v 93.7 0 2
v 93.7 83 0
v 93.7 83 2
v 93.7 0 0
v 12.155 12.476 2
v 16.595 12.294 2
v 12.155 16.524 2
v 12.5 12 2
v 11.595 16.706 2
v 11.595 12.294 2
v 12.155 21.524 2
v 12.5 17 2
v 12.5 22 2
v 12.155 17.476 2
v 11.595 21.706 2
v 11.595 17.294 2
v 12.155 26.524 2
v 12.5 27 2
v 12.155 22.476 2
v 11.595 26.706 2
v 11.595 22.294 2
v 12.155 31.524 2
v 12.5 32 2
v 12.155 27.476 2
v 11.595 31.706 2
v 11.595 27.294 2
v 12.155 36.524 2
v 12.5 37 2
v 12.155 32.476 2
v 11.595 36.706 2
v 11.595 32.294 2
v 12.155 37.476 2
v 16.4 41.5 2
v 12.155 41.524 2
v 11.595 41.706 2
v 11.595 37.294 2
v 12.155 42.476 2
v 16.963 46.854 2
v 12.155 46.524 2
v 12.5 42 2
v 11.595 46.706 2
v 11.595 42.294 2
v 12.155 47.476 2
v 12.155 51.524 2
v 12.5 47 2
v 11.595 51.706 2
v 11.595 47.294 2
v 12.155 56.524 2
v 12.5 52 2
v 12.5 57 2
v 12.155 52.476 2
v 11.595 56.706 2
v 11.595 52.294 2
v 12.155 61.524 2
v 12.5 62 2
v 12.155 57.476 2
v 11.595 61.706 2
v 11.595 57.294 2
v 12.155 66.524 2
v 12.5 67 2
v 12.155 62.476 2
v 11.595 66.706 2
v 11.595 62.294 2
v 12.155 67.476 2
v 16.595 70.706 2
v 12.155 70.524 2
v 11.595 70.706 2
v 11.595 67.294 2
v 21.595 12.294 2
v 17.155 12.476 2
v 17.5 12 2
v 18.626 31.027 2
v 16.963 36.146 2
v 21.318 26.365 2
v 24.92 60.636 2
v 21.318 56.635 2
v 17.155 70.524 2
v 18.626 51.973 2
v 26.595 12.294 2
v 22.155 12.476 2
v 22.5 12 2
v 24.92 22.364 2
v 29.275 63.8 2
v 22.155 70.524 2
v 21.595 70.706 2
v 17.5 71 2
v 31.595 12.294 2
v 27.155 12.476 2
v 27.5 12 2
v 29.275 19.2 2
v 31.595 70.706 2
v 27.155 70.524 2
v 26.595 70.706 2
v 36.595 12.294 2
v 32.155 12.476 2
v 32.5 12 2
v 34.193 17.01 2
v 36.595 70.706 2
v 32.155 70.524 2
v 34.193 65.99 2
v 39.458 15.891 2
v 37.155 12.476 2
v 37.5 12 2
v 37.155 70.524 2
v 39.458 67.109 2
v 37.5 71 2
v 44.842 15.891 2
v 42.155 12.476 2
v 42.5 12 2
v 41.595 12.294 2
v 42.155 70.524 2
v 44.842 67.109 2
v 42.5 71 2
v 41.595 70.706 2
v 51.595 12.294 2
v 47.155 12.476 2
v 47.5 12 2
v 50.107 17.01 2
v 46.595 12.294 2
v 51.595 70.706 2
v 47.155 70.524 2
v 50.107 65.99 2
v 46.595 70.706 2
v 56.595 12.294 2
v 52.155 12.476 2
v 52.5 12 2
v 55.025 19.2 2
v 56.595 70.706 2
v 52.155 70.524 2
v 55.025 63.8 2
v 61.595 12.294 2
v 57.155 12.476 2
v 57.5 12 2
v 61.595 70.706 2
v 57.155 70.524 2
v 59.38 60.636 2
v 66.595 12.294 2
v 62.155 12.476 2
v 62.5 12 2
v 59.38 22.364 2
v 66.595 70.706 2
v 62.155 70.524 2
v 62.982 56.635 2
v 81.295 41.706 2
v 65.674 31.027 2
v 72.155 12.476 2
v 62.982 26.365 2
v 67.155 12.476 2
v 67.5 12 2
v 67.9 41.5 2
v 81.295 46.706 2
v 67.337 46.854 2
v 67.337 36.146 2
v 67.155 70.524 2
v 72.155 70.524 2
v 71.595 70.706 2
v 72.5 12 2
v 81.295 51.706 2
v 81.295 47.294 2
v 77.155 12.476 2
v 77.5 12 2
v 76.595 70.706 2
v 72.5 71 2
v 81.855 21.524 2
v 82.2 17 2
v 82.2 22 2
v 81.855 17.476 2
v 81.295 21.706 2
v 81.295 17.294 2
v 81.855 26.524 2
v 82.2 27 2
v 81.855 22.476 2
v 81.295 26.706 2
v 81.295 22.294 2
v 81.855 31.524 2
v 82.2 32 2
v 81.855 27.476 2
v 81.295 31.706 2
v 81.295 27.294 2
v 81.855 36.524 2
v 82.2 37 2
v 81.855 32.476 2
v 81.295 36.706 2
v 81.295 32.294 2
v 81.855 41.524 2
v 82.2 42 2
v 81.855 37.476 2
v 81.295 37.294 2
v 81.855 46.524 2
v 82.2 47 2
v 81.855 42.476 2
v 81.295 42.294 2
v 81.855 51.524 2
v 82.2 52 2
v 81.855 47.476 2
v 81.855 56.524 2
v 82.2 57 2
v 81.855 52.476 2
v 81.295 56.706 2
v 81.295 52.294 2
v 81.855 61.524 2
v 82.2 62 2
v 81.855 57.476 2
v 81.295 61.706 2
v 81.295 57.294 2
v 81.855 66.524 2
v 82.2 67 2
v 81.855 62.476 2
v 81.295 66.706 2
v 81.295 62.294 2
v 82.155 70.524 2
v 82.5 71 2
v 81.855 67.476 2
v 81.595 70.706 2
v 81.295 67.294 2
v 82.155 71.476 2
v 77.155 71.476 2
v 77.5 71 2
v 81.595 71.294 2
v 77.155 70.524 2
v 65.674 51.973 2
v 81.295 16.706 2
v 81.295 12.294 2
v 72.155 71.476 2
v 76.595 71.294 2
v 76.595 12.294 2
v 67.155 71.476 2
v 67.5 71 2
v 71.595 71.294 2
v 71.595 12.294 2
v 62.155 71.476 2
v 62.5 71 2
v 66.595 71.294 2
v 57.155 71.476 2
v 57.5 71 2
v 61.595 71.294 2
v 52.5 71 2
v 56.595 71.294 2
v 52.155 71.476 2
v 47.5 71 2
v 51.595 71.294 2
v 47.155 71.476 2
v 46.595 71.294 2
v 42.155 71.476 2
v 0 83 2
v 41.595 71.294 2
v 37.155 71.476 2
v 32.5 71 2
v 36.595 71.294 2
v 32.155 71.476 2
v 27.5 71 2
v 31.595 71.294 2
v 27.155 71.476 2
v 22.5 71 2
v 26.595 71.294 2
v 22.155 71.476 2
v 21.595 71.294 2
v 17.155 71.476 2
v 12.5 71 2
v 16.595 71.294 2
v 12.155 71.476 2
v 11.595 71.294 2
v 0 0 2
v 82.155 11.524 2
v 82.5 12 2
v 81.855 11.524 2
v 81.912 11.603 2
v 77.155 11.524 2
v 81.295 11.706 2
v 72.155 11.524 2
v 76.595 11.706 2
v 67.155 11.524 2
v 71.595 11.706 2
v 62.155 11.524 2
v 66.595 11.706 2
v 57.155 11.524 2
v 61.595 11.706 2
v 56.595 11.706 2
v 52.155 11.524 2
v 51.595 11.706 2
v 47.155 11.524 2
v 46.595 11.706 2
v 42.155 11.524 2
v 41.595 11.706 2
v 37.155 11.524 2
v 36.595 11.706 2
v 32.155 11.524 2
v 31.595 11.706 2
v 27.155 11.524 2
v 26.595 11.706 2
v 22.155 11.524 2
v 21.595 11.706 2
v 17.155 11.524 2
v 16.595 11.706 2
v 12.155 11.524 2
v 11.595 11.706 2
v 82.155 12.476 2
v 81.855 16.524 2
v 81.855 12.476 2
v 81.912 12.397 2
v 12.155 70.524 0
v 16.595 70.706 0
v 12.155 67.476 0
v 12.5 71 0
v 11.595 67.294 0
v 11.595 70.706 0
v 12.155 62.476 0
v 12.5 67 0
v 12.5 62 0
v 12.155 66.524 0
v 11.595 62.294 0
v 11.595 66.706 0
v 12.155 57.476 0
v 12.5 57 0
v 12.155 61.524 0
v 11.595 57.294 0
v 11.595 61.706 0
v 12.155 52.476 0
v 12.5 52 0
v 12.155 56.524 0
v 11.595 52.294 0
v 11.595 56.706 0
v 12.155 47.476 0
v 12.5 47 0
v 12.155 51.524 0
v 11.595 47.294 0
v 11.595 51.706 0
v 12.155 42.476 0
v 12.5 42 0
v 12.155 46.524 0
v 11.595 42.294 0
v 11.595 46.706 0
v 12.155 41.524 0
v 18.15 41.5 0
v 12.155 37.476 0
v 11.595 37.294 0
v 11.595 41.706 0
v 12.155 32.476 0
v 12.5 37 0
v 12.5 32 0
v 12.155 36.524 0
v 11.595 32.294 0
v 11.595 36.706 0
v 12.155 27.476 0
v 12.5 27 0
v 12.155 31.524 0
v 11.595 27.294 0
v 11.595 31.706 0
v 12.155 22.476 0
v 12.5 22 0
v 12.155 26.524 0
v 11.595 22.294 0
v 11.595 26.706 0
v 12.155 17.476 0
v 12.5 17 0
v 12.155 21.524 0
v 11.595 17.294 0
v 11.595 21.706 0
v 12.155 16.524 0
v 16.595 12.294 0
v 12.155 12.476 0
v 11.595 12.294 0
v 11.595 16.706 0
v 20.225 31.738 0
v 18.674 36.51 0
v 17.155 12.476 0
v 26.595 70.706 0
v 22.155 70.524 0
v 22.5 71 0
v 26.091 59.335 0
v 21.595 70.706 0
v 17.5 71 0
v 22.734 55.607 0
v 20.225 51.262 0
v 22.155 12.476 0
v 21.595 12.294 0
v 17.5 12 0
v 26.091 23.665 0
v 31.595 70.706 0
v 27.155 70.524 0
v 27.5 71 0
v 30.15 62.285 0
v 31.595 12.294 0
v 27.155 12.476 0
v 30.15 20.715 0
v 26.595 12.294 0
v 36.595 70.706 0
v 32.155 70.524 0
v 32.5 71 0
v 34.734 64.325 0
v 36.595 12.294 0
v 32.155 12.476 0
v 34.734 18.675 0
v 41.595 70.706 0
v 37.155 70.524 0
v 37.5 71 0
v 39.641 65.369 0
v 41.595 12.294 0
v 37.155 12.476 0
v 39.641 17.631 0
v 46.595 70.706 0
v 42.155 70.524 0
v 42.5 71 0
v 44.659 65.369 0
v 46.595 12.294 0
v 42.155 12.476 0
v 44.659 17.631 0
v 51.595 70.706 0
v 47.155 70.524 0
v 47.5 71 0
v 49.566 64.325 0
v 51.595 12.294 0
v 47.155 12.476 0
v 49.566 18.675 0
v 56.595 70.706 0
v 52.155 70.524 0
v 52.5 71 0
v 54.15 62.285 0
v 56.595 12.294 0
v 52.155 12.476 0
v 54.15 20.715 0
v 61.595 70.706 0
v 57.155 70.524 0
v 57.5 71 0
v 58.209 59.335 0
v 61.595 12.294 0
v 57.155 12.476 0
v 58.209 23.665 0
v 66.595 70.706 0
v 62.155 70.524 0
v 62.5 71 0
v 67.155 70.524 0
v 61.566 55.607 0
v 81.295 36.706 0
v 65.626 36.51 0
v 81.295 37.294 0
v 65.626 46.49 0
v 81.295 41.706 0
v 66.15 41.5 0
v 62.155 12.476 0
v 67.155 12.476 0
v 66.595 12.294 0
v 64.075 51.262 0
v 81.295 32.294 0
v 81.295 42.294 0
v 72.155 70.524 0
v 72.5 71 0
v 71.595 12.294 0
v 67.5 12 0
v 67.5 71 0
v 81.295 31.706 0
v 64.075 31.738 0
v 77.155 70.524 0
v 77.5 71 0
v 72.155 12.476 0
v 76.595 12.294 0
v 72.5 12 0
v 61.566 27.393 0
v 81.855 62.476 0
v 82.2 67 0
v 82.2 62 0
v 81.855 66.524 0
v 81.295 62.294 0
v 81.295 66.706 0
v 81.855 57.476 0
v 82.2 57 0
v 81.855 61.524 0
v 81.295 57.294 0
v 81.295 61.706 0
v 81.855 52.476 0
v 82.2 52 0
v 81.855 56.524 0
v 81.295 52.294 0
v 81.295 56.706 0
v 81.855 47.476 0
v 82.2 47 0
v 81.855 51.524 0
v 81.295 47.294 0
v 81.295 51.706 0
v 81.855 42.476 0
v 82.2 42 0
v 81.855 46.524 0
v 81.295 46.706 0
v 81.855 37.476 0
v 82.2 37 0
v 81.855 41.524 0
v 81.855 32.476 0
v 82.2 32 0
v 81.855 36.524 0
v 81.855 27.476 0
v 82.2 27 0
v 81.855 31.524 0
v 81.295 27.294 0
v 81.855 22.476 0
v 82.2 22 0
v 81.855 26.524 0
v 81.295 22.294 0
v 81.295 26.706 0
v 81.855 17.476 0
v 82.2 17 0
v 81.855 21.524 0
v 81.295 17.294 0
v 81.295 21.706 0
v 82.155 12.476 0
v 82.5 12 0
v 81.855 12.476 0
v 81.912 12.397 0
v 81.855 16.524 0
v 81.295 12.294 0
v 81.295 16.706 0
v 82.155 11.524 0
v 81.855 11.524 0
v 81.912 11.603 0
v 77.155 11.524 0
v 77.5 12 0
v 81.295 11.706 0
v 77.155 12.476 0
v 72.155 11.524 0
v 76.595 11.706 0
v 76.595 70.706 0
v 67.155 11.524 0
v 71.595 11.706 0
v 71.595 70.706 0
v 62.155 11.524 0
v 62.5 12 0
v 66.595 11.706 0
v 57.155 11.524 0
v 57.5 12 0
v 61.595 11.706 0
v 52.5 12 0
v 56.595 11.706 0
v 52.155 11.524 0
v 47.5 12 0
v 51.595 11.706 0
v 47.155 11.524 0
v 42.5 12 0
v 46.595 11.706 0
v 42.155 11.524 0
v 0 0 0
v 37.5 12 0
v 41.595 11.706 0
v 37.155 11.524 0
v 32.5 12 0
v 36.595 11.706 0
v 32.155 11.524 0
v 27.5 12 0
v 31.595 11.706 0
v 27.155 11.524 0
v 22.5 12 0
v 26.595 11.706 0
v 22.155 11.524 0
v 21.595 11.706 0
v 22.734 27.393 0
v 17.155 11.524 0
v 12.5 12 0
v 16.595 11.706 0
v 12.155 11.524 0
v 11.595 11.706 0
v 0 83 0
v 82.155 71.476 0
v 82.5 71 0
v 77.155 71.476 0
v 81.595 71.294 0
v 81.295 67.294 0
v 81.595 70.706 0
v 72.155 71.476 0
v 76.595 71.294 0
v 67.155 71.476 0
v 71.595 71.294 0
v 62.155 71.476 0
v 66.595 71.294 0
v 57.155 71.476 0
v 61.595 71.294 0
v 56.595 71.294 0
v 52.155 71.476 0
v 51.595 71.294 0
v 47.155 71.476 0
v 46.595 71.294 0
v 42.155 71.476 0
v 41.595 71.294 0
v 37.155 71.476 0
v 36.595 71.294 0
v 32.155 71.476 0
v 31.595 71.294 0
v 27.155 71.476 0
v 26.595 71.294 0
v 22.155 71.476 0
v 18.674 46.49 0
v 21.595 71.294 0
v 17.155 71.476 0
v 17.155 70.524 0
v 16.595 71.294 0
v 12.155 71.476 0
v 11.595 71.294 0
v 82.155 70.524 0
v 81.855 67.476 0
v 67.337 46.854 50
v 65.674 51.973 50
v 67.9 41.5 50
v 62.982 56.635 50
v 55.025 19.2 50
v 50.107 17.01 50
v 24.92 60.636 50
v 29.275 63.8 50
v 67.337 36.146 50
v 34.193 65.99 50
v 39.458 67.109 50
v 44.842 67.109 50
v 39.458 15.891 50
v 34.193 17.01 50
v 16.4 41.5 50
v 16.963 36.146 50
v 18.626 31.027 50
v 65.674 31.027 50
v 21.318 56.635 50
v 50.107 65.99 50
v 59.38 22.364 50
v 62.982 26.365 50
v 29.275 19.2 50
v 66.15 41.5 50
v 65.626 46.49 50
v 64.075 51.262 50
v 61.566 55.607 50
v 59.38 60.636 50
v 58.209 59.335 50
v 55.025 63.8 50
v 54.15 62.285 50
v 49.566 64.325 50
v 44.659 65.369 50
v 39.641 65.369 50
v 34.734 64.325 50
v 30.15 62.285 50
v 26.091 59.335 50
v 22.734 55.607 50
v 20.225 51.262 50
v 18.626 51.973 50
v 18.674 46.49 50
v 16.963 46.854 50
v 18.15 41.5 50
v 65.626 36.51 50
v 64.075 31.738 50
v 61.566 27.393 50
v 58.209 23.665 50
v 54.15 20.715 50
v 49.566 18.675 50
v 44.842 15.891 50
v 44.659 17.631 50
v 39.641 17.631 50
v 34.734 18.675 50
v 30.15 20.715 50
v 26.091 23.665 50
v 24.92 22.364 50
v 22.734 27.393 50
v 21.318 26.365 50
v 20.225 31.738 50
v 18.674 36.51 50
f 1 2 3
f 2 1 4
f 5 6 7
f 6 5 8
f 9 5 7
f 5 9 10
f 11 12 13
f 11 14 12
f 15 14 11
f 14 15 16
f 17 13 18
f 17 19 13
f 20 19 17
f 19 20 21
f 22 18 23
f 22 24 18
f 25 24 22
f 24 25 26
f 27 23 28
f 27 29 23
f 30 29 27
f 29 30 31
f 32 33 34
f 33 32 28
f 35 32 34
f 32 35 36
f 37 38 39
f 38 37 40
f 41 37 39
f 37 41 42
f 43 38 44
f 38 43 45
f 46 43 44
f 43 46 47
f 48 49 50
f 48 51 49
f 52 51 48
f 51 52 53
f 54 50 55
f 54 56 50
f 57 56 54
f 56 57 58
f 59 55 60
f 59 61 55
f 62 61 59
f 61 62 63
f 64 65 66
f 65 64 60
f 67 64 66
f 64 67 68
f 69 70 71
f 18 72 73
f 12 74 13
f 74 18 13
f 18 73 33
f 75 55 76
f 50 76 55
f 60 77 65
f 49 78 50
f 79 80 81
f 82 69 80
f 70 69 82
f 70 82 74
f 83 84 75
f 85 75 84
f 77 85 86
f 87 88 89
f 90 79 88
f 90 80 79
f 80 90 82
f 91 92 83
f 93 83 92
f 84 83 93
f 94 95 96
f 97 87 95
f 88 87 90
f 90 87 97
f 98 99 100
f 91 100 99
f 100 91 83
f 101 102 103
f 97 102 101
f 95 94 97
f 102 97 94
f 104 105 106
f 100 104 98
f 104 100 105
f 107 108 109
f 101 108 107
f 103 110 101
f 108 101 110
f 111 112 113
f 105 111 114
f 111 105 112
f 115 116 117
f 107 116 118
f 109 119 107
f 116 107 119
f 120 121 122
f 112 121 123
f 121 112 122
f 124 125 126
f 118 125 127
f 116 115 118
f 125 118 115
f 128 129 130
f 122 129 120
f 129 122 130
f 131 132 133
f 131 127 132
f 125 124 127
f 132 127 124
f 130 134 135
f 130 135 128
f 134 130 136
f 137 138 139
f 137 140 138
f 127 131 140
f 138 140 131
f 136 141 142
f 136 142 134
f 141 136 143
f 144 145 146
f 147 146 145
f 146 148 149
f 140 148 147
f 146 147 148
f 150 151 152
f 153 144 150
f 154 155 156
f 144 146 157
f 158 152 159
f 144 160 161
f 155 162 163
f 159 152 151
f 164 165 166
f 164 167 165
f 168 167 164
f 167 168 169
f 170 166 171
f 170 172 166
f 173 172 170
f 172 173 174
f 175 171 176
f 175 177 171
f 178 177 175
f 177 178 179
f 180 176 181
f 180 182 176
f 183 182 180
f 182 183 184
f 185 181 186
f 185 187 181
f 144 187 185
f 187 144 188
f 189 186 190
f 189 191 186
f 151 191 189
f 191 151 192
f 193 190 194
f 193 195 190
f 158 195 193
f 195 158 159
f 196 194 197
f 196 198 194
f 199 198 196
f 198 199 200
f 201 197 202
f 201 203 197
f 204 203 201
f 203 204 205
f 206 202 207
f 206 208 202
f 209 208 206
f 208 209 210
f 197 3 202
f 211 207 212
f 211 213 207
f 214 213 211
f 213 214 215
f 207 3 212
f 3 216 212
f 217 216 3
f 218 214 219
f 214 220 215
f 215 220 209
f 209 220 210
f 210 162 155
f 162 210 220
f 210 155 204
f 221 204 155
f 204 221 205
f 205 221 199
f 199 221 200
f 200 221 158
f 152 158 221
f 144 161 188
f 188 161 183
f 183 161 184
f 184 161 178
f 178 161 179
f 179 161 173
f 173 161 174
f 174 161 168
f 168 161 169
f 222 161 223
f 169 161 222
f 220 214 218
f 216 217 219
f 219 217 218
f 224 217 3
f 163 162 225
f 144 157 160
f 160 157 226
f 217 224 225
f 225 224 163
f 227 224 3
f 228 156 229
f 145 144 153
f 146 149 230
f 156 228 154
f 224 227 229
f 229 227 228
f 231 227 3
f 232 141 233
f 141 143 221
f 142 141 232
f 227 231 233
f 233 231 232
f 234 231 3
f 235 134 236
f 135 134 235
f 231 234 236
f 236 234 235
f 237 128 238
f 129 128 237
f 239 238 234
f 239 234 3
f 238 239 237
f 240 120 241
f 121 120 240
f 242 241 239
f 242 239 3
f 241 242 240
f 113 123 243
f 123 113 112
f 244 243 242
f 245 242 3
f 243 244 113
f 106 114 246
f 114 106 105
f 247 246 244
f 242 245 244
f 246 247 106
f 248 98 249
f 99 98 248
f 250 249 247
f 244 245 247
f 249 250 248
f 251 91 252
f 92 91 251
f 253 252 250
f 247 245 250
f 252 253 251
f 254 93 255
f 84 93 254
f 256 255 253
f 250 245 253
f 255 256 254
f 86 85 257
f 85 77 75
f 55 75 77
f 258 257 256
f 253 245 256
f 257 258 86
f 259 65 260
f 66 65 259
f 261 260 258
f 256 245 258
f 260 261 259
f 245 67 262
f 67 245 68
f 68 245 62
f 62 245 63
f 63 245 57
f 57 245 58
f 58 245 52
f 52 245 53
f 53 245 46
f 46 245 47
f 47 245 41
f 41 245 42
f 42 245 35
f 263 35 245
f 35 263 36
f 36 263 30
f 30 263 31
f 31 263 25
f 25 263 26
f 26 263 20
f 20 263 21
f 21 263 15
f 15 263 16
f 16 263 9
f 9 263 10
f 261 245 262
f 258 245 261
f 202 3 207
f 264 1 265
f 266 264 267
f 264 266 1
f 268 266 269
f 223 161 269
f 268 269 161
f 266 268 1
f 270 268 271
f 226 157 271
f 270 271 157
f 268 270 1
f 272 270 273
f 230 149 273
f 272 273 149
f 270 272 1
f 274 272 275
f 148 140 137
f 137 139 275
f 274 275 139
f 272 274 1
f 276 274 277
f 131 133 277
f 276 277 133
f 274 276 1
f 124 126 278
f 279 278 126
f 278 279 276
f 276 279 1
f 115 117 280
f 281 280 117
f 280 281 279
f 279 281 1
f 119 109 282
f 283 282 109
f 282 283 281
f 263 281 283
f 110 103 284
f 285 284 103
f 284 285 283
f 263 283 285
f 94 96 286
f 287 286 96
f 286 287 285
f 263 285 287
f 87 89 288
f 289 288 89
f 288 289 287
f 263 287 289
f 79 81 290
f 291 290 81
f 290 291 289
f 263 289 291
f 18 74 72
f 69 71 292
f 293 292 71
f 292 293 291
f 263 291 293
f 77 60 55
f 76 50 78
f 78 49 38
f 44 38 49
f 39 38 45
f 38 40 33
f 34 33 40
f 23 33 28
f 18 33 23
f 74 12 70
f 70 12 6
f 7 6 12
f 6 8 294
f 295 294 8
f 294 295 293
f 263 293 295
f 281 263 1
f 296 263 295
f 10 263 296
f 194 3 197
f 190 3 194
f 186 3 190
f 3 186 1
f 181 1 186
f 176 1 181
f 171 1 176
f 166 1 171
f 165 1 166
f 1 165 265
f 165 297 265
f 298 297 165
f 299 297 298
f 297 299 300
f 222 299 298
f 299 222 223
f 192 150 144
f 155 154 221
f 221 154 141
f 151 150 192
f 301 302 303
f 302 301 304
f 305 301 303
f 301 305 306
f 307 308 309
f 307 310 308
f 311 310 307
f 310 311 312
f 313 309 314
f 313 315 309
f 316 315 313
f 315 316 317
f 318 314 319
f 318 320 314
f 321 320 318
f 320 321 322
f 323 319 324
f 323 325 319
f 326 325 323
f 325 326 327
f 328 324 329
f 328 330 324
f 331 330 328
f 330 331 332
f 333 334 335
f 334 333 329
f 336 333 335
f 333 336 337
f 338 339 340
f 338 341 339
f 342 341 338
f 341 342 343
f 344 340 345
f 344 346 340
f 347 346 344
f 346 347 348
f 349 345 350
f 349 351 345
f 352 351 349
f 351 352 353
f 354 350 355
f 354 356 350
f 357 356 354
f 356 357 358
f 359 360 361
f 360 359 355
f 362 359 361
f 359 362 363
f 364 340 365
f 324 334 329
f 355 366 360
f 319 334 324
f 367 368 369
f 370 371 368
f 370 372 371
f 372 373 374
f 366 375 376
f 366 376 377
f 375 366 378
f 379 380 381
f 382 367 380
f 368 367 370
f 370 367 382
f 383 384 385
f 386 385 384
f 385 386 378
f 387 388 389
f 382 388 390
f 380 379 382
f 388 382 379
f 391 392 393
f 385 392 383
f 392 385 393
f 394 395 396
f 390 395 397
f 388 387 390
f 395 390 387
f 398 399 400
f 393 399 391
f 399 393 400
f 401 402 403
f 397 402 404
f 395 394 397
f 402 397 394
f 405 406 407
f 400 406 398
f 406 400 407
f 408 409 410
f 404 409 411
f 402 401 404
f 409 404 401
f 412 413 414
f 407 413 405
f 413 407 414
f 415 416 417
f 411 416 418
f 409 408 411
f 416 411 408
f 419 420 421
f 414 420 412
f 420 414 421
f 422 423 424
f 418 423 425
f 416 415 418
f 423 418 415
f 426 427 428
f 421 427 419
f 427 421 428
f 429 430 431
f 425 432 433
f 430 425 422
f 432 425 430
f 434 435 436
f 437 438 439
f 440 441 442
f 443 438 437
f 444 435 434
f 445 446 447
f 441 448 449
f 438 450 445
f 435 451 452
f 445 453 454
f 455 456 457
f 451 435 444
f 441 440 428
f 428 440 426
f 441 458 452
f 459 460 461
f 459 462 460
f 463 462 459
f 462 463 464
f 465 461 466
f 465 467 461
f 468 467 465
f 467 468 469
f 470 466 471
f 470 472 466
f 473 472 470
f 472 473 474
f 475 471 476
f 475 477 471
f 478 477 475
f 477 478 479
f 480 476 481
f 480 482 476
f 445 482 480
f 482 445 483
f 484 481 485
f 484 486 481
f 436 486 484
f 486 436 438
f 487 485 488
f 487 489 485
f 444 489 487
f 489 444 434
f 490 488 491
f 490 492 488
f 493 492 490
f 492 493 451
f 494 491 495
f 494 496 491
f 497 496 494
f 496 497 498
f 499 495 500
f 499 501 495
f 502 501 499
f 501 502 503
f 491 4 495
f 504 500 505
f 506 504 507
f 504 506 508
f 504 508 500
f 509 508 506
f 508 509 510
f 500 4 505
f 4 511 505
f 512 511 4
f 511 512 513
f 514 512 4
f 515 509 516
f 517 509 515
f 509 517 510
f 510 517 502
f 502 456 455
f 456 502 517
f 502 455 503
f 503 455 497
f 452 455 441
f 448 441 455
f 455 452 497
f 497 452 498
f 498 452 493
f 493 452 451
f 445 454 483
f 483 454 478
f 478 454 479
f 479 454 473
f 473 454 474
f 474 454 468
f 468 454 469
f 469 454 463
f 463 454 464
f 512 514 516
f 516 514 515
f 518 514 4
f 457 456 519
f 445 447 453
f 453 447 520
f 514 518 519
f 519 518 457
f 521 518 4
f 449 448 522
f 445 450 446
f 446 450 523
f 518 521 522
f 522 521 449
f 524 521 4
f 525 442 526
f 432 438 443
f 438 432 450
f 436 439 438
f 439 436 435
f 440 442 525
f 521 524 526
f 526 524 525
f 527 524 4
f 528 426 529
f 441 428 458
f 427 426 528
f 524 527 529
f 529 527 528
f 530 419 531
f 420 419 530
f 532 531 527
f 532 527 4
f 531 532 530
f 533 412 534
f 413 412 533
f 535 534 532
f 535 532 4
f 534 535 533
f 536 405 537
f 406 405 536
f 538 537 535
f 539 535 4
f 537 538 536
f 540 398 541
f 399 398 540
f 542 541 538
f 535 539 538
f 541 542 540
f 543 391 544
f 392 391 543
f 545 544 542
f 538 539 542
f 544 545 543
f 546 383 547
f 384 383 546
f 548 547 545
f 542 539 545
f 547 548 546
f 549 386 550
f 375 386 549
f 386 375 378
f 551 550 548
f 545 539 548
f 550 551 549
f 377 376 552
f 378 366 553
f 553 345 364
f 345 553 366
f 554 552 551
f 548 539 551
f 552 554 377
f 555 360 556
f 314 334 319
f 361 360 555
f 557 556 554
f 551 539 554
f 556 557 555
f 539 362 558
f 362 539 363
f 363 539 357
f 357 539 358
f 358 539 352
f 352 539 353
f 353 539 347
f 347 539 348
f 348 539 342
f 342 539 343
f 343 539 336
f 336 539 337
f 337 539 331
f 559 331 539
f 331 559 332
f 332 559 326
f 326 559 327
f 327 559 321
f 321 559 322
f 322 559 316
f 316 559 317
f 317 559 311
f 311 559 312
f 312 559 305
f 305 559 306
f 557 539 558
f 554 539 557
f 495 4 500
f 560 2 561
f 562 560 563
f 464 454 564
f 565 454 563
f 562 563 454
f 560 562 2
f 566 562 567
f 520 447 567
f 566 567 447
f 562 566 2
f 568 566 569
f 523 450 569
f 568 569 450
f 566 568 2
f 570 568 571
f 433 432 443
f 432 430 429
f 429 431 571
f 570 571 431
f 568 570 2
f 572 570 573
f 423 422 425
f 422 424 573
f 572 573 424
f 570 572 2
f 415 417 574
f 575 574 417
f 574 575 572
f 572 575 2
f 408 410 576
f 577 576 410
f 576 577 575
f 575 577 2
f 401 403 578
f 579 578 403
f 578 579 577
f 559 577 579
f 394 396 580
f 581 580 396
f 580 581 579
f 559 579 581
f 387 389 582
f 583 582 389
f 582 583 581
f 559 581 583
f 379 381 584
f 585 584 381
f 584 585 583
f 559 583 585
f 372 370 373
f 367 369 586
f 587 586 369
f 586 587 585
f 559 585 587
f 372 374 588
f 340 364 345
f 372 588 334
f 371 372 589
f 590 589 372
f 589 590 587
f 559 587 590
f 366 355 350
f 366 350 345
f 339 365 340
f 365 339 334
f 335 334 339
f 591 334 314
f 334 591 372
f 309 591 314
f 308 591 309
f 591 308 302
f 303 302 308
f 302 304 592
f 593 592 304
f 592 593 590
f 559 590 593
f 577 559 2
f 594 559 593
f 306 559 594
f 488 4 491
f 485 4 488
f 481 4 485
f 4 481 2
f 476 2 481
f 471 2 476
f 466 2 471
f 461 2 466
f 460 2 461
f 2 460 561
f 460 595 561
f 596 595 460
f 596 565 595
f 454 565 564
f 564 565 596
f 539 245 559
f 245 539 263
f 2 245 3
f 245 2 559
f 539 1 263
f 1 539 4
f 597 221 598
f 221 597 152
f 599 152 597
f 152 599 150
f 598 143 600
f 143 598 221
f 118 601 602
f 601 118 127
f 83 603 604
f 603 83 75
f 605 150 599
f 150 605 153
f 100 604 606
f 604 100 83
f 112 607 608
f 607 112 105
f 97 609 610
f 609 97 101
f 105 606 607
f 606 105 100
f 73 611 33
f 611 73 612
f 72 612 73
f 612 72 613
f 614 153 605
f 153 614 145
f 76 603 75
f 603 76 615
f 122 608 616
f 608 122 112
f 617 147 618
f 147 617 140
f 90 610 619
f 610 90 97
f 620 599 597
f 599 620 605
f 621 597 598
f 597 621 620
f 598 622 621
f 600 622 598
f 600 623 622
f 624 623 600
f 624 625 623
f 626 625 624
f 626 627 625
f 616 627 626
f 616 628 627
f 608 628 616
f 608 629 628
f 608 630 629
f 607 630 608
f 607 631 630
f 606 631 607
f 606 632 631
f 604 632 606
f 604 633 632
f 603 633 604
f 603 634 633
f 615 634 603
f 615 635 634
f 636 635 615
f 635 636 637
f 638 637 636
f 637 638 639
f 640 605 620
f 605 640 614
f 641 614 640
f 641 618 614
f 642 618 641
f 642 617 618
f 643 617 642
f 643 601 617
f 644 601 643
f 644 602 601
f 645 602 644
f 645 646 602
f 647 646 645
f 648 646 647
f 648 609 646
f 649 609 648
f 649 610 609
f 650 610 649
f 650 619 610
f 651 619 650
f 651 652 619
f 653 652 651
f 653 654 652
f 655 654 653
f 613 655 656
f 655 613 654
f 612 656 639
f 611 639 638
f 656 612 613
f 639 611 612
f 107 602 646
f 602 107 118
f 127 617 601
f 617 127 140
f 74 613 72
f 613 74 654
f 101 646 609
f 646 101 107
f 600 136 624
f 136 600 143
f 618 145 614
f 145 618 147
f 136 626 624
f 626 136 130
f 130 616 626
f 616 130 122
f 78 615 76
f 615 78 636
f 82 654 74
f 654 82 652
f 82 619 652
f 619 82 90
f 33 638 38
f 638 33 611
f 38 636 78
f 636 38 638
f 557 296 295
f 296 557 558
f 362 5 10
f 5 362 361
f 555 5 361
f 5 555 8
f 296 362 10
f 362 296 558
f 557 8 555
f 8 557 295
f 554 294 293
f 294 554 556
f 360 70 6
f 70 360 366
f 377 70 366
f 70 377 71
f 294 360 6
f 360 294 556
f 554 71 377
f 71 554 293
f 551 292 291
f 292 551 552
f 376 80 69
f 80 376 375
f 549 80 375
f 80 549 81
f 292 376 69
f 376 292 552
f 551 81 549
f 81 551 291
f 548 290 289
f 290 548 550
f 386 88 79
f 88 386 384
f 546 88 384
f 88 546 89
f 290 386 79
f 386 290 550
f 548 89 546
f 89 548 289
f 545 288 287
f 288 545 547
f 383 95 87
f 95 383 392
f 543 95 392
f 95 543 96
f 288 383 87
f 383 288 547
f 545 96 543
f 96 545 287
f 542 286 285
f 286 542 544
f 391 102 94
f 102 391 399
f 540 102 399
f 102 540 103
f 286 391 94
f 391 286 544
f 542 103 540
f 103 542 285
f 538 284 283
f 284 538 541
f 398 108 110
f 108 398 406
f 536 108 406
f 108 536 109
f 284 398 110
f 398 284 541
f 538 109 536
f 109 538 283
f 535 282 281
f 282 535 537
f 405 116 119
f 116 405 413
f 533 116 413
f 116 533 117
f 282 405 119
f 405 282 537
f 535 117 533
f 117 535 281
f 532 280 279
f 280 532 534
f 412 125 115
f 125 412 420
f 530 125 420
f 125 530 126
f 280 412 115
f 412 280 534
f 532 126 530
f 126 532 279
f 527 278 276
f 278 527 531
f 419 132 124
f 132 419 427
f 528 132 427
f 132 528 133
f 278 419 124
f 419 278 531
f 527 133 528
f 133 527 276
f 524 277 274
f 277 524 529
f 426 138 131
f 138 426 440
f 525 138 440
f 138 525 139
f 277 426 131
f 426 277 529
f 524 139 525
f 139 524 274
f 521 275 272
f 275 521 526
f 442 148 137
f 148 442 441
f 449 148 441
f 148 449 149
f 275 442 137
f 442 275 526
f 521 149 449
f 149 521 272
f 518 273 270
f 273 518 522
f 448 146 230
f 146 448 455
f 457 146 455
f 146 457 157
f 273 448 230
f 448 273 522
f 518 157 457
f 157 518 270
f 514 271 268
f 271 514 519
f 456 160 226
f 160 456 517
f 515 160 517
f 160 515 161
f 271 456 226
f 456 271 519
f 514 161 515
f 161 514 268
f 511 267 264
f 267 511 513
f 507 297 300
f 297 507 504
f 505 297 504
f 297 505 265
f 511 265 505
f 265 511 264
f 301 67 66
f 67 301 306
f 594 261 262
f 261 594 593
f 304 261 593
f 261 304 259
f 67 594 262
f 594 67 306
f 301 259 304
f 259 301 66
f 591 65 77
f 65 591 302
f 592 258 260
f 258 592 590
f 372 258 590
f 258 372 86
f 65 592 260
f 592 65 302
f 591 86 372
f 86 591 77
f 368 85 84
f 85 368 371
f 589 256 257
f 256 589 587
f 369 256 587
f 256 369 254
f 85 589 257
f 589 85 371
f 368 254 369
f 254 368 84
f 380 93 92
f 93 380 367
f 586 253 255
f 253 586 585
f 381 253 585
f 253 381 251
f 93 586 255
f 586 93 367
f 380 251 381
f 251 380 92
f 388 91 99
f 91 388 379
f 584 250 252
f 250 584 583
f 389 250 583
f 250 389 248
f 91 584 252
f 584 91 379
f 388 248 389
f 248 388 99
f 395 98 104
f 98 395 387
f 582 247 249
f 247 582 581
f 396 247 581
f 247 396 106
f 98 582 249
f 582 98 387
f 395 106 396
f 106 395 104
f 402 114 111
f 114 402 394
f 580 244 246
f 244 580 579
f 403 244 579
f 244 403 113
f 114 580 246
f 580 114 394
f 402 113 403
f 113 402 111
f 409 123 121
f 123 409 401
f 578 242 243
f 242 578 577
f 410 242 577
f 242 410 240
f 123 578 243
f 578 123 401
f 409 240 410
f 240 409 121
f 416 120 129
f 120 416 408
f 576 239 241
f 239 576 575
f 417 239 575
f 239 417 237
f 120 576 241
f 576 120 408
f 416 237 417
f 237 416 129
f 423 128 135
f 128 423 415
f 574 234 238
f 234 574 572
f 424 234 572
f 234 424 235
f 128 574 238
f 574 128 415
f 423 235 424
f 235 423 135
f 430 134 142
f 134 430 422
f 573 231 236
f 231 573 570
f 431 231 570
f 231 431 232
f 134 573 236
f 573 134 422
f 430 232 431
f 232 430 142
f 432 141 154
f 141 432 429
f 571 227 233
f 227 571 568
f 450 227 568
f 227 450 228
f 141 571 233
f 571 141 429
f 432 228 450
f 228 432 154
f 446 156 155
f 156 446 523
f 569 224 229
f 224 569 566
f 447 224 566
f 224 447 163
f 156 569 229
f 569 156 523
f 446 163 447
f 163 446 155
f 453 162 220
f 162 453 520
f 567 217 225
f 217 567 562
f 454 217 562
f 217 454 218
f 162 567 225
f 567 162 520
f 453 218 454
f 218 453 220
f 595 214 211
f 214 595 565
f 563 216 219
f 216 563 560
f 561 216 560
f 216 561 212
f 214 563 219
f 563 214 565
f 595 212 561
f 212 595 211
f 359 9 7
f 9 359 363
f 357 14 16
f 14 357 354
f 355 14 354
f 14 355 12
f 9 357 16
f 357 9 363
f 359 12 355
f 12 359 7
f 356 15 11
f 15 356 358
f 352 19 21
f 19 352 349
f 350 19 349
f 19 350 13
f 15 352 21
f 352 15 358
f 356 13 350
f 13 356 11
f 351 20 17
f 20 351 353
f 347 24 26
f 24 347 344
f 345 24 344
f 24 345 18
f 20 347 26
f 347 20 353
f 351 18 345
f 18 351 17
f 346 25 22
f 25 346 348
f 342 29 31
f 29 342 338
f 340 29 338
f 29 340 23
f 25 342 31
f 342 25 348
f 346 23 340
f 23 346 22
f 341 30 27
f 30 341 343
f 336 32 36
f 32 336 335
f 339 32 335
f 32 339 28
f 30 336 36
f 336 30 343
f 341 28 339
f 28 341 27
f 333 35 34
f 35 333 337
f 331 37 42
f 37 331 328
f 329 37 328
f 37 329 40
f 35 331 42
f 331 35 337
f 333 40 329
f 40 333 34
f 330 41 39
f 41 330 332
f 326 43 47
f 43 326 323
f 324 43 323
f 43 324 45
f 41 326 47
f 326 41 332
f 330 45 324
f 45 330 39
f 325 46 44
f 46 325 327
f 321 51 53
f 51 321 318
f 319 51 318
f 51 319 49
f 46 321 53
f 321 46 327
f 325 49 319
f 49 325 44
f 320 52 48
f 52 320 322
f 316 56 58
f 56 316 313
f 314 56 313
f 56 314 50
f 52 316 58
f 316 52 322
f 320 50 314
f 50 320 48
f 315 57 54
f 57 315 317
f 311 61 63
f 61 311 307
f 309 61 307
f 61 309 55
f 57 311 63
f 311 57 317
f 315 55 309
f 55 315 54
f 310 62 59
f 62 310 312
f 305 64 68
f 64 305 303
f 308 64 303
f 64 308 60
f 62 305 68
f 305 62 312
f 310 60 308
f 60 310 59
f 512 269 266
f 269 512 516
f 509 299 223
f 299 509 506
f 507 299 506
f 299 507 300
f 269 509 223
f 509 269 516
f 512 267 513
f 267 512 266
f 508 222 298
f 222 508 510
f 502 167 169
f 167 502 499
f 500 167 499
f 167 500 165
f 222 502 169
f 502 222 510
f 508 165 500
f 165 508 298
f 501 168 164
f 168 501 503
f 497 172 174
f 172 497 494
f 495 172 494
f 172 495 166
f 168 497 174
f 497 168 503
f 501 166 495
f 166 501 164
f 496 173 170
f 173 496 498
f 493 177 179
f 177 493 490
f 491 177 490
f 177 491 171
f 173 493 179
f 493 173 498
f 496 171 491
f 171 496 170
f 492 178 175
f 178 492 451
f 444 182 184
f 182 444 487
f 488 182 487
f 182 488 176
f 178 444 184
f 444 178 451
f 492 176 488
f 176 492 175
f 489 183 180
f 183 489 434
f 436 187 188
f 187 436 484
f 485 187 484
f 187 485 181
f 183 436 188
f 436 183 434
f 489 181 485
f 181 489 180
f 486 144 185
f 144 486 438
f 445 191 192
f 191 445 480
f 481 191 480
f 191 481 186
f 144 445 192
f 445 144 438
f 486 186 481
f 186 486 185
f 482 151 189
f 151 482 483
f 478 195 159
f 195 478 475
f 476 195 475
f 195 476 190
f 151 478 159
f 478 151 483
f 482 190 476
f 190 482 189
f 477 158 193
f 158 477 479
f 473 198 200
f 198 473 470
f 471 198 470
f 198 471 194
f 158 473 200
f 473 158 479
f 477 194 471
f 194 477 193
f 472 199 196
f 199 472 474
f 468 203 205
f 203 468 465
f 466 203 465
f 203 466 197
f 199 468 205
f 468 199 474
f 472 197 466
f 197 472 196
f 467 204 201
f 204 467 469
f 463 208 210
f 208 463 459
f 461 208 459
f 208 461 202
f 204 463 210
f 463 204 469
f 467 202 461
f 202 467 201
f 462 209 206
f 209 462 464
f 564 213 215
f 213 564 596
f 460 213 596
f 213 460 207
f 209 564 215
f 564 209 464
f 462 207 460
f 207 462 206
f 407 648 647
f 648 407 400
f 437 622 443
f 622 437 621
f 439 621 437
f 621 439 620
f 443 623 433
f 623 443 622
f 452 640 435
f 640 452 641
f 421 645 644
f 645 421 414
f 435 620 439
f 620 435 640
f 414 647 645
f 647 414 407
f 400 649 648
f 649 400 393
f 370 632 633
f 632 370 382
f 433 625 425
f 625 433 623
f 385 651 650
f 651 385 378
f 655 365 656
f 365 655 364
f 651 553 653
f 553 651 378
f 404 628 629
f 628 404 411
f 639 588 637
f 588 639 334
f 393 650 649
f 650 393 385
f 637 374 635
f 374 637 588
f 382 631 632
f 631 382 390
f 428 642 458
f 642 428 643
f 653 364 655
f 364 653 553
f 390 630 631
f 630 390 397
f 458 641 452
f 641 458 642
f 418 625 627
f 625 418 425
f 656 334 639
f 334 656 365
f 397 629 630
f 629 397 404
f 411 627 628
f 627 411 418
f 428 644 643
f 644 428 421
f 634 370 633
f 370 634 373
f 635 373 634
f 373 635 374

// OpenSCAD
difference(){
    union(){
        cube([93.7,83,2]);
        translate([46.3/2+19,46.3/2+(83-46.3)/2,0])
        cylinder(d=51.5,h=50);  
    }
    translate([46.3/2+19,46.3/2+(83-46.3)/2,-25])
    cylinder(d=48,h=100);


    translate([12,12,0])
    for (x = [0 : 5 : 70]){
        color("red")
        translate([x,0,-5])
        cylinder(d=1,h=10);    
    }

    translate([12,83-12,0])
    for (x = [0 : 5 : 70]){
        color("red")
        translate([x,0,-5])
        cylinder(d=1,h=10);    
    }

    translate([12,12,0])
    for (y = [0 : 5 : 58]){
        color("red")
        translate([0,y,-5])
        cylinder(d=1,h=10);    
    }

    translate([93.7-12,12,0])
    for (y = [0 : 5 : 58]){
        color("red")
        translate([0,y,-5])
        cylinder(d=1,h=10);    
    }
}
